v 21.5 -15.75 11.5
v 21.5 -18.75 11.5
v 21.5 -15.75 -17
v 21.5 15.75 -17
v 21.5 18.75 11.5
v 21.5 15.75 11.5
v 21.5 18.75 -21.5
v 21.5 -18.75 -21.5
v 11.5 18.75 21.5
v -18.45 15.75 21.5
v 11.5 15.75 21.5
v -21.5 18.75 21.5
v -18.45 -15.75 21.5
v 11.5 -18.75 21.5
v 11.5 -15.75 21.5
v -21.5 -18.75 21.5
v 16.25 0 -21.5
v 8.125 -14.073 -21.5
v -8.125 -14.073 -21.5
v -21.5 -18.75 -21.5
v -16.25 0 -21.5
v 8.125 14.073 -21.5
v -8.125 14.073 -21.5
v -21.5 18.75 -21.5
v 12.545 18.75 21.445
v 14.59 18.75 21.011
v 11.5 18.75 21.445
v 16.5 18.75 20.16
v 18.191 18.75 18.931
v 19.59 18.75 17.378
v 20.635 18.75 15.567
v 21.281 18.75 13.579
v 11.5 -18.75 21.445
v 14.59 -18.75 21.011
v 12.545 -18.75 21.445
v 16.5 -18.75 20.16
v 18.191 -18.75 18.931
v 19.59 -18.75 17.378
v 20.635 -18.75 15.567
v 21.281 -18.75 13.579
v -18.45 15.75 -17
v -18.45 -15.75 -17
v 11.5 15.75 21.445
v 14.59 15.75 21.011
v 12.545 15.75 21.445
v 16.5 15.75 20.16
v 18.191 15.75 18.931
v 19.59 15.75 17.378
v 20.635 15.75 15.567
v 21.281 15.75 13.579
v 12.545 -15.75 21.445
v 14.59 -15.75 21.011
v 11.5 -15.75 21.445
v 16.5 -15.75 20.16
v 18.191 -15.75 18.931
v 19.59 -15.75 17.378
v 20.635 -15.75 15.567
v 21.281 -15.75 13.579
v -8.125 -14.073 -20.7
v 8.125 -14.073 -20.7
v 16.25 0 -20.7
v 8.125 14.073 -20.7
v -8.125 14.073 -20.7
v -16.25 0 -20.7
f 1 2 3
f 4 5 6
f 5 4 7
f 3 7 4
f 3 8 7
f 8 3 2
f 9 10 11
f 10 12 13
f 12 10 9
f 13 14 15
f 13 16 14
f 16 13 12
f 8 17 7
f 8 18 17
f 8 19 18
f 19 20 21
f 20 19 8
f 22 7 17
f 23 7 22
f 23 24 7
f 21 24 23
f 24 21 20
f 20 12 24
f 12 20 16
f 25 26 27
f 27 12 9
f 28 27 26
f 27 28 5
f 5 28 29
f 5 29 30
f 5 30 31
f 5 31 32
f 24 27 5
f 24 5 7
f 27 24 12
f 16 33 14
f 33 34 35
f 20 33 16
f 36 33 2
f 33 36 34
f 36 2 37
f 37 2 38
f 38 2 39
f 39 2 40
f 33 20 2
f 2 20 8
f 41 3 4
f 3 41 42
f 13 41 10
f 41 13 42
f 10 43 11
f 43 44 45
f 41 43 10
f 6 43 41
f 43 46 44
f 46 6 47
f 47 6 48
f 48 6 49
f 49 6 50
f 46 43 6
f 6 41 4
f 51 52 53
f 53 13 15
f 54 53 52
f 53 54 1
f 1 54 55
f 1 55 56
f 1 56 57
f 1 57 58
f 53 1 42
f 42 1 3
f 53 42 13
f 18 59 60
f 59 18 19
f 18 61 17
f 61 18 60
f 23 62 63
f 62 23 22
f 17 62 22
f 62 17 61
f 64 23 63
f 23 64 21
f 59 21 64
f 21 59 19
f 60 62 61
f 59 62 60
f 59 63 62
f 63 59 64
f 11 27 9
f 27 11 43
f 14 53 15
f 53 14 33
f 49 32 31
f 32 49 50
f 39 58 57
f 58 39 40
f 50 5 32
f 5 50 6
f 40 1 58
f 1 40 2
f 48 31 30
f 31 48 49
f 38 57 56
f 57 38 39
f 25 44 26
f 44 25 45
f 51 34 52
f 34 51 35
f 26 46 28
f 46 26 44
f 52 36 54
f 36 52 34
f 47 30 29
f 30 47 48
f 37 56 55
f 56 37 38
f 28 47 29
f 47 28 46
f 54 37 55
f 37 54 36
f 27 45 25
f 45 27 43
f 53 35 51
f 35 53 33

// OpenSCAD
        /*-------------------------------------------
         |                                          |
         |     Fuz zm verstauen carromm Brett       |
         |     Design : C. Pohl                     |
         |                                          |
         -------------------------------------------- */
 
// Model
difference(){
difference(){
    //grundkörper
    difference(){
        cube([40+3,31.5+6,40+3],center = true);
        translate([1.6,0,3])cube([40.1,31.5,40],center = true);
        };
    //ausnehmung f. filzgleiter
    translate([0,0,-((43/2)-0.3)]) cylinder(1,32.5/2,32.5/2,center=true,$fn=6);
    };
// verrundung
    difference(){
     translate([(23/2),-(45/2),23/2]) cube([30,45,30]);
    translate([(23/2),0,23/2])rotate([90,0,0]) cylinder(45,10,10,center=true);
    };
};
